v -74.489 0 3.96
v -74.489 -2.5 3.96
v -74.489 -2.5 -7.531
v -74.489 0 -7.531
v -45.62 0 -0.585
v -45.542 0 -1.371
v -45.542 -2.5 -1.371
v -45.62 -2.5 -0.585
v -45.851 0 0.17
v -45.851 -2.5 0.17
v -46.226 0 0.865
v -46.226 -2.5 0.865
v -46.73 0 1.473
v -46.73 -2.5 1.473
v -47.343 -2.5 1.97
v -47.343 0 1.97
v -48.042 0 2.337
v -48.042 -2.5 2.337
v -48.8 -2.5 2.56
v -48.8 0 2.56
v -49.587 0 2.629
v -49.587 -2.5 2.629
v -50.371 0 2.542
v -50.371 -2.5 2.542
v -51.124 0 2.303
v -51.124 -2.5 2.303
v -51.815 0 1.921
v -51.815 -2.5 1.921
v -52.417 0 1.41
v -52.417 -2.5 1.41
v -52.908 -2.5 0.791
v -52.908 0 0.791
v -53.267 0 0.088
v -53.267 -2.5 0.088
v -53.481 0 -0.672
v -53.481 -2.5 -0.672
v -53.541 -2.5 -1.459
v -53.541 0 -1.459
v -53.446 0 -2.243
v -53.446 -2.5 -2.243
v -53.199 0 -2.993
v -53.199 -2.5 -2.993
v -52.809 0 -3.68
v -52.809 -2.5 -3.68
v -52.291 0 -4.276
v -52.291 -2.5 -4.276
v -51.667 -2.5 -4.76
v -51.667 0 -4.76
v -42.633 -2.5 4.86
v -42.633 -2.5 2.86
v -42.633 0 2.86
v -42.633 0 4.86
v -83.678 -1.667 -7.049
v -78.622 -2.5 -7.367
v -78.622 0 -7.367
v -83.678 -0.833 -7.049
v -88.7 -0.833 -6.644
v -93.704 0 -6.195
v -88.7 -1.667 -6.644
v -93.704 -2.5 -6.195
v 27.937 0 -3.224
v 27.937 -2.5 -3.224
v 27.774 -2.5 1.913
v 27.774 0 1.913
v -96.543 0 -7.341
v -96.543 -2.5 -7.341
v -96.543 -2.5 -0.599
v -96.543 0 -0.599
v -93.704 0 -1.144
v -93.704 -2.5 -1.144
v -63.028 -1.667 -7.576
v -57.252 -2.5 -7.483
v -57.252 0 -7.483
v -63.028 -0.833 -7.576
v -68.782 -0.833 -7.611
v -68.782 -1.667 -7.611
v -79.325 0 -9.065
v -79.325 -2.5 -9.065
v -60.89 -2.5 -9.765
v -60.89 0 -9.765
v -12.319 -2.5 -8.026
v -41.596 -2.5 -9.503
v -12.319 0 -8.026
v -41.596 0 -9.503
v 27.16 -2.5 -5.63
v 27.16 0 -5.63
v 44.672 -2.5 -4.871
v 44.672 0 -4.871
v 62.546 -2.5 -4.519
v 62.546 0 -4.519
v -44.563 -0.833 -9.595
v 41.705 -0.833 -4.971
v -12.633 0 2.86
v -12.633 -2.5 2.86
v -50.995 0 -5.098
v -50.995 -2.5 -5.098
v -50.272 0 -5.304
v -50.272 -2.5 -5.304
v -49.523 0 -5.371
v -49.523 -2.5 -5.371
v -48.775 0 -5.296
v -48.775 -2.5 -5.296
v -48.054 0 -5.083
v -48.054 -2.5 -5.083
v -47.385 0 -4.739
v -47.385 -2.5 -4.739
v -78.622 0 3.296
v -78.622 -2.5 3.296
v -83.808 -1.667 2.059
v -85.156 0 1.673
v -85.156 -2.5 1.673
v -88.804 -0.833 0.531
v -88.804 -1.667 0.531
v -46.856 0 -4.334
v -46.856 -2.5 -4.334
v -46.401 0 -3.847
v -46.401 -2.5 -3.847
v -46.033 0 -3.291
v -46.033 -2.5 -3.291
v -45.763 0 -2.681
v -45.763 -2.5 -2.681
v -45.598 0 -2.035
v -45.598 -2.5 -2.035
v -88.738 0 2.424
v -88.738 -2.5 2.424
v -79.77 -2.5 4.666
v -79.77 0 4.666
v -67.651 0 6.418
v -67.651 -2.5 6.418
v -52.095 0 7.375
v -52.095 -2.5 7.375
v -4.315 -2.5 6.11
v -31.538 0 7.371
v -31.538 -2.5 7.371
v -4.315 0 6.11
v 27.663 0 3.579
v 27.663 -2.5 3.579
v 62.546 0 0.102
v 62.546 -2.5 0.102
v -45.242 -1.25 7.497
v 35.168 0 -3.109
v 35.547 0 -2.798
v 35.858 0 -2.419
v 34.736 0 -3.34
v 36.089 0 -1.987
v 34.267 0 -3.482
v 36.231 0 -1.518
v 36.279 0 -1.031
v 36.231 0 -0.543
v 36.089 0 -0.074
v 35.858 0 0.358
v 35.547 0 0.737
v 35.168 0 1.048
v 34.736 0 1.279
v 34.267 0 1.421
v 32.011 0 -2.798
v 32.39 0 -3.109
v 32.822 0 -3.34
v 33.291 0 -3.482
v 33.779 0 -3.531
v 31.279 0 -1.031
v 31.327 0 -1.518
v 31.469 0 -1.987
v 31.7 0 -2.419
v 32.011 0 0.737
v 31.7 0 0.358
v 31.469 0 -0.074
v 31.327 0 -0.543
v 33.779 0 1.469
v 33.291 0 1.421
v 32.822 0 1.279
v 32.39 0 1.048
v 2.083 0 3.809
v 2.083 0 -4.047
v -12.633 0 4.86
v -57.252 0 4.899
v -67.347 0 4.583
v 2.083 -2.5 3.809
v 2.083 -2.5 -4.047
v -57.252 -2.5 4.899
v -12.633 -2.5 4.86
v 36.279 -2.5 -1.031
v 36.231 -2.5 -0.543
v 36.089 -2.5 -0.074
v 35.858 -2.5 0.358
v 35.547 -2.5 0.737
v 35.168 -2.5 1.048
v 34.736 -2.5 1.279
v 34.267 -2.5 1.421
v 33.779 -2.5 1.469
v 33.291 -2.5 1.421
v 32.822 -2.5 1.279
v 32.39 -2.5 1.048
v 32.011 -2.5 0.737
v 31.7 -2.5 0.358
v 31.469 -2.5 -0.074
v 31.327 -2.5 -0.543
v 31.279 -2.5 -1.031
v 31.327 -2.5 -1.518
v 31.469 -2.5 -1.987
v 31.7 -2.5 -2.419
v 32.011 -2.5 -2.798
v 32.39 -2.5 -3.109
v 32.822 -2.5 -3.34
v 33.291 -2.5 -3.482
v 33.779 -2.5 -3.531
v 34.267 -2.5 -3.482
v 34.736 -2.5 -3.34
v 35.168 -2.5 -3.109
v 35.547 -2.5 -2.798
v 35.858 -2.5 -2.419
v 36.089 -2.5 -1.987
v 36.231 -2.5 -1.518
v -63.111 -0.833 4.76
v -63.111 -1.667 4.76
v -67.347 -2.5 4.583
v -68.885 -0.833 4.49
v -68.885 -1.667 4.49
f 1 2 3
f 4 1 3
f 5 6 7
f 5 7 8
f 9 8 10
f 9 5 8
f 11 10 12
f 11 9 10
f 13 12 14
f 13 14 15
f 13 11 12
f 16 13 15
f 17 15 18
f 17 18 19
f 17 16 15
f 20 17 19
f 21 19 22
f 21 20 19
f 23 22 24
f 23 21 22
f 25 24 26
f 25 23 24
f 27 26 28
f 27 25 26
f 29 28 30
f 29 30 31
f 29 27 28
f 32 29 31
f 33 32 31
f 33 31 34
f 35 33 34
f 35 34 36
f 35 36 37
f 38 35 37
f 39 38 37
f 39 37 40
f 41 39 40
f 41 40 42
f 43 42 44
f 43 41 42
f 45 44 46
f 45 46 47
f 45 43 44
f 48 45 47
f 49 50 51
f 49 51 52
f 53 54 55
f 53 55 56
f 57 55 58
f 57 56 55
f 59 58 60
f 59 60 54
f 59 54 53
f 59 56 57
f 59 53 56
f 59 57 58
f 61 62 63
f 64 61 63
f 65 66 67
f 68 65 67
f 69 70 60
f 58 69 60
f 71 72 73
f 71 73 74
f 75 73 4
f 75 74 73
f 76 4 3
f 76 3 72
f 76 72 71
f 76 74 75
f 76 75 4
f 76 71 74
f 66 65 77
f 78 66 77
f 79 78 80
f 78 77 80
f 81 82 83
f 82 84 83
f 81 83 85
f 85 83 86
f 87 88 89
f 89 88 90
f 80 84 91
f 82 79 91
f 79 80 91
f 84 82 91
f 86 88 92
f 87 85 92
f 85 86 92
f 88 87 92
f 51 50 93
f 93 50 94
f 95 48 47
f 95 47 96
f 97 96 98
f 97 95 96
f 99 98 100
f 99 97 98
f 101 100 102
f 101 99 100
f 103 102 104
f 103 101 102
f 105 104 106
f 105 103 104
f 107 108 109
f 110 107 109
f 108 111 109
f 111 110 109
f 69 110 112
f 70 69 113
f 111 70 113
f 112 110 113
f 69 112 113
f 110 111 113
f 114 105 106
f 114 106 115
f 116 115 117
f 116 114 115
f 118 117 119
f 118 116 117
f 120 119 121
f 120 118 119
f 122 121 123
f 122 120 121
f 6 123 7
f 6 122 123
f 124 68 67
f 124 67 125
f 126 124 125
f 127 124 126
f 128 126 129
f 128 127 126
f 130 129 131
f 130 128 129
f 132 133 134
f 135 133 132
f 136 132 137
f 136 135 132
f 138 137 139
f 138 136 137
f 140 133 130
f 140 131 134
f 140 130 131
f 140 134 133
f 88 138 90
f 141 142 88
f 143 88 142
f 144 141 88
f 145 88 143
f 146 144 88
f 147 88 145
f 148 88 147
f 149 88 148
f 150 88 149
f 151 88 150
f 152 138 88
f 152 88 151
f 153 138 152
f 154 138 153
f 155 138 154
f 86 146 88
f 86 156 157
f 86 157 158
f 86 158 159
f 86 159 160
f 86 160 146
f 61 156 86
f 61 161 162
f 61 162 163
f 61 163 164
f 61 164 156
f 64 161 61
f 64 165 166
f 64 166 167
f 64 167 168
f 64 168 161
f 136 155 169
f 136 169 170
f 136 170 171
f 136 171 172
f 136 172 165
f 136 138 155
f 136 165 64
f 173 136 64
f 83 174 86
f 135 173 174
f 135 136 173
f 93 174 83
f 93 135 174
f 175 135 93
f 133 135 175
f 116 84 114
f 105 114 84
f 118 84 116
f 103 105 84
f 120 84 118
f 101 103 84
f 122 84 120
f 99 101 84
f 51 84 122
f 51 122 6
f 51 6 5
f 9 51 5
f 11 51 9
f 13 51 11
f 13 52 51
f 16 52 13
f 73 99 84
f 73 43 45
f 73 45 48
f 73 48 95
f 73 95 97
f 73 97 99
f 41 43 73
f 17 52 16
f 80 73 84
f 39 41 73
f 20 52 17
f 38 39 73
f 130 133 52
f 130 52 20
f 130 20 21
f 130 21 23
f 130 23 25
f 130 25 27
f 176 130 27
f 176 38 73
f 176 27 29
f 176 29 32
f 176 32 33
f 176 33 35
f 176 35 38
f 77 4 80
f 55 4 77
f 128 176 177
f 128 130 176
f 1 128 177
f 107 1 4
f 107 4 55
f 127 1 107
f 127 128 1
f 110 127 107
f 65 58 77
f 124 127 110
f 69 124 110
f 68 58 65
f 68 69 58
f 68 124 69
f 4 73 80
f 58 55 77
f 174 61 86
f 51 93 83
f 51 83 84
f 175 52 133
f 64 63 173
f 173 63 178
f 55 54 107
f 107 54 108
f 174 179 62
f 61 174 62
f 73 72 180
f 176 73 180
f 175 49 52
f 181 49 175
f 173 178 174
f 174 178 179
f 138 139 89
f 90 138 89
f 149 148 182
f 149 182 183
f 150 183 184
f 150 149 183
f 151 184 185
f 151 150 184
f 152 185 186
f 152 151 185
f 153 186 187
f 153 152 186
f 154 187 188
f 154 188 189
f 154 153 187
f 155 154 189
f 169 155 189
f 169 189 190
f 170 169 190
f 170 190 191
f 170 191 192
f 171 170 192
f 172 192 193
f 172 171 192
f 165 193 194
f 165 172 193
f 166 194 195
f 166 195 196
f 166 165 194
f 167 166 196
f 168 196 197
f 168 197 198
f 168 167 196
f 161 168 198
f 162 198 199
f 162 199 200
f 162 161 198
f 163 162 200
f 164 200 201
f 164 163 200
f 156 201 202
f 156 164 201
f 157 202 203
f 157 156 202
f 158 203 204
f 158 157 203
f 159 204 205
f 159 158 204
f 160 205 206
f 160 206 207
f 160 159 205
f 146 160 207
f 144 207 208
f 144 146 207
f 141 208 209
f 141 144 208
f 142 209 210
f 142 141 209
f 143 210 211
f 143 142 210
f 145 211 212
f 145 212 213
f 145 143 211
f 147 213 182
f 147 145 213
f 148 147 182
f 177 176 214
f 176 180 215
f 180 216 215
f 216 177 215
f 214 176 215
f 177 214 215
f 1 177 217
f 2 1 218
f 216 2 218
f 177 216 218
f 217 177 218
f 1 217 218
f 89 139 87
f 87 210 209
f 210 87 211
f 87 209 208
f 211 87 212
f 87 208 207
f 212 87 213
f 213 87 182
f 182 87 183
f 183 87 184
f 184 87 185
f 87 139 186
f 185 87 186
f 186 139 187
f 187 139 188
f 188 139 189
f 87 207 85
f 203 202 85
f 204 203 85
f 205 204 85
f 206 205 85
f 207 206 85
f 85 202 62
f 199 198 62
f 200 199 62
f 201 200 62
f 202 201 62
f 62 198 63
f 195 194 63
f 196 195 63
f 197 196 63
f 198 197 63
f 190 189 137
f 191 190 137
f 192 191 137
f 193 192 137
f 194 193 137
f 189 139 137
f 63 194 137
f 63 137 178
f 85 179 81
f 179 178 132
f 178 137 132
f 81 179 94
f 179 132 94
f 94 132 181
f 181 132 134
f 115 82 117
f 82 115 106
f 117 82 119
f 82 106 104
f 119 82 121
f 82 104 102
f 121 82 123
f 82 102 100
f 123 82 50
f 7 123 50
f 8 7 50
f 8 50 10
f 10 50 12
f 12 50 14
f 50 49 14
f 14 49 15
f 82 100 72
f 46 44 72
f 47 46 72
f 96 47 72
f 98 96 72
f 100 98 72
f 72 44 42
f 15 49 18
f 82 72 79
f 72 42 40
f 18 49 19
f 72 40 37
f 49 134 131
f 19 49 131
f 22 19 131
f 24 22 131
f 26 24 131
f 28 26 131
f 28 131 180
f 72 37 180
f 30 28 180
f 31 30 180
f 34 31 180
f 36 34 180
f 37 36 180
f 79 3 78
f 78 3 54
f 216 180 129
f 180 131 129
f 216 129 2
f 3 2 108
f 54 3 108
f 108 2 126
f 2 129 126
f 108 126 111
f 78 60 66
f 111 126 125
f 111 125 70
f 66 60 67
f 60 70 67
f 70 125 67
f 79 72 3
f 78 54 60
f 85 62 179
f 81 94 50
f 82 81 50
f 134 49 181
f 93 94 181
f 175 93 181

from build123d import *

# Parameters (mm, degrees)
F2_DEPTH = 2.5
F1_R     = 2.5
F3_DEPTH = 2.5
F5_DEPTH = 2.5
F4_W     = 30
F4_H     = 2
F6_DEPTH = 2.5
F7_DEPTH = 2.5


with BuildPart() as f2:
    # F0 (on Front) → F2 (new body)
    with BuildSketch(Plane.XZ):
        with BuildLine():
            add(Edge.make_bspline(
                [(-96.9805282175, -0.8100506688), (-84.7869920978, 5.1468541776), (-38.6381415733, 10.9636146396), (42.6881882799, 2.4723259958), (100, -4.047003109)],
                knots=[0, 0, 0, 0, 0.374886421, 1, 1, 1, 1], degree=3))
            add(Edge.make_bspline(
                [(-97.5447368223, -7.1186651935), (-99.939251346, -6.5508492693), (-102.885147974, -5.168950634), (-100.0067471137, -2.3789404522), (-96.9805282175, -0.8100506688)],
                knots=[0.0564585679, 0.0564585679, 0.0564585679, 0.0564585679, 0.4847104148, 1, 1, 1, 1], degree=3))
            add(Edge.make_bspline(
                [(-96.5428845142, -7.3406707446), (-96.8949965543, -7.2673488468), (-97.22905608, -7.1935231869), (-97.5447368223, -7.1186651935)],
                knots=[0, 0, 0, 0, 0.0564585679, 0.0564585679, 0.0564585679, 0.0564585679], degree=3))
            add(Edge.make_bspline(
                [(-96.5428845142, -7.3406707446), (-80.7020161693, -9.4302402111), (-44.2471235075, -11.1181020976), (41.8622965332, -3.5518856086), (82.0915186506, -4.6802794425), (100, -4.047003109)],
                knots=[0, 0, 0, 0, 0.2987594418, 0.6837410955, 1, 1, 1, 1], degree=3))
        make_face()
        with BuildLine():
            add(Edge.make_bspline(
                [(-99.8196757147, -4.047003109), (-99.3821638101, -3.2227137691), (-97.9006497107, -2.3042858417), (-96.3385477662, -1.6362179573)],
                knots=[0.5425000514, 0.5425000514, 0.5425000514, 0.5425000514, 1, 1, 1, 1], degree=3))
            add(Edge.make_bspline(
                [(-96.3385477662, -1.6362179573), (-85.7442874691, 3.2900694446), (-38.7960585931, 10.0747672146), (36.943279708, 1.696590452), (86.094097513, -3.3751911245)],
                knots=[0, 0, 0, 0, 0.384923117, 1, 1, 1, 1], degree=3))
            add(Edge.make_bspline(
                [(-97.3825784566, -6.0471531808), (-82.3468325761, -8.841713568), (-44.2551066449, -8.6286827794), (40.9195716837, -3.3120714751), (72.7341022162, -3.1550192186), (86.094097513, -3.3751911245)],
                knots=[0, 0, 0, 0, 0.3131273629, 0.7122131732, 1, 1, 1, 1], degree=3))
            add(Edge.make_bspline(
                [(-97.3825784566, -6.0471531808), (-98.6588937786, -5.8946130057), (-100.1661659123, -5.1778479876), (-99.9138553768, -4.2244412327), (-99.8196757147, -4.047003109)],
                knots=[0, 0, 0, 0, 0.4440177242, 0.5425000514, 0.5425000514, 0.5425000514, 0.5425000514], degree=3))
        make_face(mode=Mode.SUBTRACT)
        with BuildLine():
            add(Edge.make_bspline(
                [(-96.3385477662, -1.6362179573), (-85.7442874691, 3.2900694446), (-38.7960585931, 10.0747672146), (36.943279708, 1.696590452), (86.094097513, -3.3751911245)],
                knots=[0, 0, 0, 0, 0.384923117, 1, 1, 1, 1], degree=3))
            add(Edge.make_bspline(
                [(-99.8196757147, -4.047003109), (-99.3821638101, -3.2227137691), (-97.9006497107, -2.3042858417), (-96.3385477662, -1.6362179573)],
                knots=[0.5425000514, 0.5425000514, 0.5425000514, 0.5425000514, 1, 1, 1, 1], degree=3))
            add(Edge.make_bspline(
                [(-97.3825784566, -6.0471531808), (-98.6588937786, -5.8946130057), (-100.1661659123, -5.1778479876), (-99.9138553768, -4.2244412327), (-99.8196757147, -4.047003109)],
                knots=[0, 0, 0, 0, 0.4440177242, 0.5425000514, 0.5425000514, 0.5425000514, 0.5425000514], degree=3))
            add(Edge.make_bspline(
                [(-97.3825784566, -6.0471531808), (-82.3468325761, -8.841713568), (-44.2551066449, -8.6286827794), (40.9195716837, -3.3120714751), (72.7341022162, -3.1550192186), (86.094097513, -3.3751911245)],
                knots=[0, 0, 0, 0, 0.3131273629, 0.7122131732, 1, 1, 1, 1], degree=3))
        make_face()
        with BuildLine():
            add(Edge.make_bspline(
                [(-96.5428845142, -7.3406707446), (-96.8949965543, -7.2673488468), (-97.22905608, -7.1935231869), (-97.5447368223, -7.1186651935)],
                knots=[0, 0, 0, 0, 0.0564585679, 0.0564585679, 0.0564585679, 0.0564585679], degree=3))
            ThreePointArc((-97.5447368223, -7.1186651935), (-97.052492706, -7.2688477084), (-96.5428845142, -7.3406707446))
        make_face()
    extrude(amount=F2_DEPTH)


with BuildPart() as f2b:
    # F1 (on Front) → F2, piece 2 (new body)
    with BuildSketch(Plane.XZ):
        with Locations((33.7789729238, -1.0305350879)):
            Circle(F1_R)
    extrude(amount=F2_DEPTH)


with BuildPart() as f2c:
    # F1 (on Front) → F2, piece 3 (new body)
    with BuildSketch(Plane.XZ):
        with BuildLine():
            ThreePointArc((-45.542362095, -1.3708024857), (-51.4789804014, 2.1291274472), (-51.6671168627, -4.7598166753))
            Line((-51.6671168627, -4.7598166753), (-47.385046135, -4.7391830831))
            ThreePointArc((-47.385046135, -4.7391830831), (-46.0331411102, -3.2905337378), (-45.542362095, -1.3708024857))
        make_face()
        with BuildLine():
            Line((-47.385046135, -4.7391830831), (-51.6671168627, -4.7598166753))
            ThreePointArc((-51.6671168627, -4.7598166753), (-49.523087913, -5.3707560487), (-47.385046135, -4.7391830831))
        make_face()
    extrude(amount=F2_DEPTH)


with BuildPart() as f3_tool:
    # F1 (on Front) → F3 (new body)
    with BuildSketch(Plane.XZ):
        with BuildLine():
            ThreePointArc((-45.542362095, -1.3708024857), (-51.4789804014, 2.1291274472), (-51.6671168627, -4.7598166753))
            Line((-51.6671168627, -4.7598166753), (-47.385046135, -4.7391830831))
            ThreePointArc((-47.385046135, -4.7391830831), (-46.0331411102, -3.2905337378), (-45.542362095, -1.3708024857))
        make_face()
        with BuildLine():
            Line((-47.385046135, -4.7391830831), (-51.6671168627, -4.7598166753))
            ThreePointArc((-51.6671168627, -4.7598166753), (-49.523087913, -5.3707560487), (-47.385046135, -4.7391830831))
        make_face()
        with Locations((33.7789729238, -1.0305350879)):
            Circle(F1_R)
    extrude(amount=F3_DEPTH)


with BuildPart() as f2_1:
    add(f2.part)

    # F3: cut by f3_tool
    add(f3_tool.part, mode=Mode.SUBTRACT)

    # F4 (on face) → F5 (cut)
    with BuildSketch(Plane.XZ.offset(2.5)):
        with BuildLine():
            Line((-96.5428845142, -7.3406707446), (-96.5428845142, -0.5989118026))
            add(Edge.make_bspline(
                [(-96.9805282175, -0.8100506688), (-96.8353706427, -0.7391368787), (-96.6894893165, -0.6687582494), (-96.5428845142, -0.5989118026)],
                knots=[0, 0, 0, 0, 0.0044628238, 0.0044628238, 0.0044628238, 0.0044628238], degree=3))
            add(Edge.make_bspline(
                [(-96.9805282175, -0.8100506688), (-100.0067471137, -2.3789404522), (-102.885147974, -5.168950634), (-99.939251346, -6.5508492693), (-97.5447368223, -7.1186651935)],
                knots=[0.0564585679, 0.0564585679, 0.0564585679, 0.0564585679, 0.5717481532, 1, 1, 1, 1], degree=3))
            ThreePointArc((-97.5447368223, -7.1186651935), (-97.052492706, -7.2688477084), (-96.5428845142, -7.3406707446))
        make_face()
    extrude(amount=-F5_DEPTH, mode=Mode.SUBTRACT)

    # F4 (on face) → F6 (cut)
    with BuildSketch(Plane.XZ.offset(2.5)):
        with BuildLine():
            Line((-78.6215588156, -7.3670944992), (-78.6215588156, 3.2958948603))
            add(Edge.make_bspline(
                [(-78.6215588156, 3.2958948603), (-83.9345486349, 2.2532028855), (-88.8194569144, 0.5548157735), (-93.7043651938, -1.1435713386)],
                knots=[0.554896308, 0.554896308, 0.554896308, 0.554896308, 1, 1, 1, 1], degree=3))
            Line((-93.7043651938, -1.1435713386), (-93.7043651938, -6.1954581179))
            add(Edge.make_bspline(
                [(-78.6215588156, -7.3670944992), (-83.7013643272, -7.1077100258), (-88.7028647605, -6.6515840718), (-93.7043651938, -6.1954581179)],
                knots=[0.5793594661, 0.5793594661, 0.5793594661, 0.5793594661, 1, 1, 1, 1], degree=3))
        make_face()
        with BuildLine():
            Line((-57.251535356, -7.4831936508), (-57.251535356, 4.8988820054))
            add(Edge.make_bspline(
                [(-57.251535356, 4.8988820054), (-63.1249518816, 4.7812850577), (-68.9983684072, 4.66368811), (-74.4892291338, 3.9601280834)],
                knots=[0, 0, 0, 0, 0.4418705618, 0.4418705618, 0.4418705618, 0.4418705618], degree=3))
            Line((-74.4892291338, 3.9601280834), (-74.4892291338, -7.5306241193))
            add(Edge.make_bspline(
                [(-57.251535356, -7.4831936508), (-63.0319736557, -7.5857864832), (-68.8124119553, -7.6883793156), (-74.4892291338, -7.5306241193)],
                knots=[0, 0, 0, 0, 0.4658094847, 0.4658094847, 0.4658094847, 0.4658094847], degree=3))
        make_face()
        with Locations((-27.6331795752, 3.8601249214)):
            Rectangle(F4_W, F4_H)
        Polygon((27.7735989974, 1.9125135442), (2.0833725575, 3.8092588075), (2.0833725575, -4.047003109), (27.937149629, -3.2237600535), align=None)
    extrude(amount=-F6_DEPTH, mode=Mode.SUBTRACT)

    # F4 (on face) → F7 (cut)
    with BuildSketch(Plane.XZ.offset(2.5)):
        with BuildLine():
            add(Edge.make_bspline(
                [(62.5460875734, 0.1020588345), (74.6514883615, -1.1873862537), (87.1633646635, -2.586811085), (100, -4.047003109)],
                knots=[0.8599877614, 0.8599877614, 0.8599877614, 0.8599877614, 1, 1, 1, 1], degree=3))
            Line((62.5460875734, 0.1020588345), (62.5460875734, -4.518638291))
            add(Edge.make_bspline(
                [(62.5460875734, -4.518638291), (75.9097127299, -4.3829595873), (88.0075171585, -4.4710790211), (100, -4.047003109)],
                knots=[0.7882160183, 0.7882160183, 0.7882160183, 0.7882160183, 1, 1, 1, 1], degree=3))
        make_face()
    extrude(amount=-F7_DEPTH, mode=Mode.SUBTRACT)


with BuildPart() as f2b_1:
    add(f2b.part)

    # F3: cut by f3_tool
    add(f3_tool.part, mode=Mode.SUBTRACT)


with BuildPart() as f2c_1:
    add(f2c.part)

    # F3: cut by f3_tool
    add(f3_tool.part, mode=Mode.SUBTRACT)


solid = f2_1.part
